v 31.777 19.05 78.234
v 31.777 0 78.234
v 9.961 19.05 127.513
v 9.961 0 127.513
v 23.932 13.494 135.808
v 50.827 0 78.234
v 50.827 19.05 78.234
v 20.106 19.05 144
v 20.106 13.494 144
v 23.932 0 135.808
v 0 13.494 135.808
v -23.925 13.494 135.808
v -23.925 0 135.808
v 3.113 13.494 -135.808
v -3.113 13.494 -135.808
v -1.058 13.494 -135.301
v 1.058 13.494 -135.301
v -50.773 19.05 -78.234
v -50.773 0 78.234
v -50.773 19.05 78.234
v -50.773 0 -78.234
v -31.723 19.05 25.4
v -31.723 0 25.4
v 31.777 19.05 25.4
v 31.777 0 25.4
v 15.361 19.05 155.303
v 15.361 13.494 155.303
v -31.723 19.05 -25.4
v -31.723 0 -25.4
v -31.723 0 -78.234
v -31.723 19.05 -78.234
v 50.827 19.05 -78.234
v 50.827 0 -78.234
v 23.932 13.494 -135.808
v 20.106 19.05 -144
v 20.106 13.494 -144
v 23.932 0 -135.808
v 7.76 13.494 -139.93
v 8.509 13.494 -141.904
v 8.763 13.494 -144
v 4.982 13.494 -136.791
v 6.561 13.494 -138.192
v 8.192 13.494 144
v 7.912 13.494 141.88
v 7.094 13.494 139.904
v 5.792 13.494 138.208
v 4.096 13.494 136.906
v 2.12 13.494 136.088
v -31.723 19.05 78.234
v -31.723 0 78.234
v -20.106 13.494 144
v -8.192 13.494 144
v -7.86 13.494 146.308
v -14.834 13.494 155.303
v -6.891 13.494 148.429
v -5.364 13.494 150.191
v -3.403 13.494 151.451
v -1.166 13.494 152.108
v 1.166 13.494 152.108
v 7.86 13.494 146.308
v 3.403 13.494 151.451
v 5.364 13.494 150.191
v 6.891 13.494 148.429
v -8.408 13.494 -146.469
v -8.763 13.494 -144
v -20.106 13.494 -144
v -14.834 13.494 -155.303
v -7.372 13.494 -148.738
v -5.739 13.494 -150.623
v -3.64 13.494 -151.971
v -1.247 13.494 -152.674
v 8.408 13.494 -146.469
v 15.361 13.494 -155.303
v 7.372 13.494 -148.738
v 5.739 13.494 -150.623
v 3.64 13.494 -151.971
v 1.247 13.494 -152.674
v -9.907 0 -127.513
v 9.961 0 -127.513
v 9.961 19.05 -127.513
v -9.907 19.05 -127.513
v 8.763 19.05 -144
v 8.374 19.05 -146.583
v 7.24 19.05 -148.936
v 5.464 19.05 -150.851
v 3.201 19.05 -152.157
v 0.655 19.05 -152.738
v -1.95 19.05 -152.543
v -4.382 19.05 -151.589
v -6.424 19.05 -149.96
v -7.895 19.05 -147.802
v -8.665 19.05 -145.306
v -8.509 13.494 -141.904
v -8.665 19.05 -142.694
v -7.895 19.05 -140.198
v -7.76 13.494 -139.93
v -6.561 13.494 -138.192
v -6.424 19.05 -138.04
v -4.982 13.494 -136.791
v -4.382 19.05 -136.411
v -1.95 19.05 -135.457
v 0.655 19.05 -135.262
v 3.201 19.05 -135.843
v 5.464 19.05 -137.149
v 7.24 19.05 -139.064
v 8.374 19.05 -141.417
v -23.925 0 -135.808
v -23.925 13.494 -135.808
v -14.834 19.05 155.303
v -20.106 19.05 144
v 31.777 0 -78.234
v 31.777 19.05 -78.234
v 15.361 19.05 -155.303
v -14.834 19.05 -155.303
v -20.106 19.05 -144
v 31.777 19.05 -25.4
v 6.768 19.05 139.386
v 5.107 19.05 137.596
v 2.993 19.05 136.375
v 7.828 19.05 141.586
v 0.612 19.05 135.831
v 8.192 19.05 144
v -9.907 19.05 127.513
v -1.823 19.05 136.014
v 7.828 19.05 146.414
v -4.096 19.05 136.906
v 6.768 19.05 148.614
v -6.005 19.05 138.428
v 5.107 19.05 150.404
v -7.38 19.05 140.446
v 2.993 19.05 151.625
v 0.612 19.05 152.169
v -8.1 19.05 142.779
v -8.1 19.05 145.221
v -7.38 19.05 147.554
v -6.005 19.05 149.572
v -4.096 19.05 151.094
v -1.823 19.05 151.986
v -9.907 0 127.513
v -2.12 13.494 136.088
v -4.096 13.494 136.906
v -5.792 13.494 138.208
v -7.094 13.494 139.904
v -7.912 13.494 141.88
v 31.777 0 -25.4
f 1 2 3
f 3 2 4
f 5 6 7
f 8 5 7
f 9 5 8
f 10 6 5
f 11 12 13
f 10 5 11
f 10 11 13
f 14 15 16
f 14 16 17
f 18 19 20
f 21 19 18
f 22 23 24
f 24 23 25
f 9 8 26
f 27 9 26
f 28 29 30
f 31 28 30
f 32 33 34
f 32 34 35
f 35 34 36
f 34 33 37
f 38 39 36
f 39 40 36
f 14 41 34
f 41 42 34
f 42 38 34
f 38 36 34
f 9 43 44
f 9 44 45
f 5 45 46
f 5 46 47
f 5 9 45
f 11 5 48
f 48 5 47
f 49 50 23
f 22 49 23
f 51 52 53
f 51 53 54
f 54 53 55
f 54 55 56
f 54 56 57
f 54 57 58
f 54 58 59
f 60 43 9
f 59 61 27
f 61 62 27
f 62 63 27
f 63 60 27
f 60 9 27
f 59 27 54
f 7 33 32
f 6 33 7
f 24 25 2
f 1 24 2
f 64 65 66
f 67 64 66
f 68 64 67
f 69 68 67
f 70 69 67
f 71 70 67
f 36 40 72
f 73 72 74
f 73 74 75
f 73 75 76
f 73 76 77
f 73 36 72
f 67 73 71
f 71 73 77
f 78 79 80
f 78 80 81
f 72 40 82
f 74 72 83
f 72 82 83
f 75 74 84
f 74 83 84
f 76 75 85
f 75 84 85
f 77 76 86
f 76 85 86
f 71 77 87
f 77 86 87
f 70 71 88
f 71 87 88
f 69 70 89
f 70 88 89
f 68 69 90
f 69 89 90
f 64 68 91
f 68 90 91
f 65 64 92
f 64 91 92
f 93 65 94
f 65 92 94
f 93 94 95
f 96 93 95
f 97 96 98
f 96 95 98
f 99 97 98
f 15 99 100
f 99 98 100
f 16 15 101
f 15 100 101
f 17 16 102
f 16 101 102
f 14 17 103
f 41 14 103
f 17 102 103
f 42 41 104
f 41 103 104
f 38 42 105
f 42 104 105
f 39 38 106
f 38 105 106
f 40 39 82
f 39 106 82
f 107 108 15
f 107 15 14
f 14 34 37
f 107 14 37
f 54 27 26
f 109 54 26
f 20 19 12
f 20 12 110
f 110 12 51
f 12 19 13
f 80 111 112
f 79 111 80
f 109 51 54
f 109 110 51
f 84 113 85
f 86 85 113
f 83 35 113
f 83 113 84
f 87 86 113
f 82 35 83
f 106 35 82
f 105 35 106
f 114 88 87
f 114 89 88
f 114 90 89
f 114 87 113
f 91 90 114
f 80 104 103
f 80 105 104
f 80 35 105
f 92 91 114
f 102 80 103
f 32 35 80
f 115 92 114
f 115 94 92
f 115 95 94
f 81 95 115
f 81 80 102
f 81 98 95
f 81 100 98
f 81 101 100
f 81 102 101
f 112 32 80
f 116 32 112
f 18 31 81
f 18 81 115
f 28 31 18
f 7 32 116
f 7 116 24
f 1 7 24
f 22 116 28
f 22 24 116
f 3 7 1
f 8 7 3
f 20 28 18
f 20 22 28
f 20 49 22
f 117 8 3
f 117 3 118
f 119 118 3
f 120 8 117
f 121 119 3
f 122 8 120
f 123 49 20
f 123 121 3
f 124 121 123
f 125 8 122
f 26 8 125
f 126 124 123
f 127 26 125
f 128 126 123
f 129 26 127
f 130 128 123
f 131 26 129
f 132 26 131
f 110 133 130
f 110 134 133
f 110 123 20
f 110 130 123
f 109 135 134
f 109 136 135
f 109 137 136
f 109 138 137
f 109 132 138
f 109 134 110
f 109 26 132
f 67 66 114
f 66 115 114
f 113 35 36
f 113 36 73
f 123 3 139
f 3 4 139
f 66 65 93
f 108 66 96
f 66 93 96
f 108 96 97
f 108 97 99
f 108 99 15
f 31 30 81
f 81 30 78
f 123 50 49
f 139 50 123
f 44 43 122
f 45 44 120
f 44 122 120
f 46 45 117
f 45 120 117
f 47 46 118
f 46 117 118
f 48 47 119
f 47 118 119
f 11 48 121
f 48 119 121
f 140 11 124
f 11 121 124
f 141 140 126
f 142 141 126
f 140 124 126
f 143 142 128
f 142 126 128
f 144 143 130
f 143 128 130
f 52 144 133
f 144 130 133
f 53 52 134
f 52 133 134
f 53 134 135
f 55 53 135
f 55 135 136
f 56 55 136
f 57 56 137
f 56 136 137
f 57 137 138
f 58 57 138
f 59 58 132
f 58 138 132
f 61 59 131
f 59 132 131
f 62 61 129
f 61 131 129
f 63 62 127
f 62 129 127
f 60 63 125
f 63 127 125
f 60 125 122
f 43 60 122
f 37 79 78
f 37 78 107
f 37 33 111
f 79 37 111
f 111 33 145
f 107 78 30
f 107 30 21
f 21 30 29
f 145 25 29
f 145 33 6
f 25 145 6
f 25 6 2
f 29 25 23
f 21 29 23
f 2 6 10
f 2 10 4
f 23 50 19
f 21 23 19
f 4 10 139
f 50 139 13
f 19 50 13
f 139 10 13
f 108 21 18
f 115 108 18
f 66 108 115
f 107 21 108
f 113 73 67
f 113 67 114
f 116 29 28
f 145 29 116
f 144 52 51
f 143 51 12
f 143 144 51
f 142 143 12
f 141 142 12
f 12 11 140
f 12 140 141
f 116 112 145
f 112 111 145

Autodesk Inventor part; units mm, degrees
ref_plane "YZ Plane" through (0, 0, 0) normal (1, 0, 0) x (0, 1, 0)
ref_plane "XZ Plane" through (0, 0, 0) normal (0, 1, 0) x (-1, 0, 0)
ref_plane "XY Plane" through (0, 0, 0) normal (0, 0, 1) x (1, 0, 0)
sketch "Sketch1" plane through (0, 0, 0) normal (0, 1, 0) x (-1, 0, 0)
  line L0 (0, -213.8682) -> (0, 213.8682) projected
  line L1 (20.1057, -144) -> (-20.1057, -144)
  line L2 (-50.827, -78.2337) -> (-50.827, 78.2337)
  line L3 (-20.1057, 144) -> (20.1057, 144)
  line L4 (50.773, 78.2337) -> (50.773, -78.2337)
  line L5 (158.1712, 0) -> (-85.66, 0) projected
  line L6 (50.773, 78.2337) -> (20.1057, 144)
  line L7 (50.773, 78.2337) -> (123.3381, 78.2337) construction
  line L8 (-50.827, 78.2337) -> (-20.1057, 144)
  line L9 (-20.1057, 144) -> (20.1057, 144)
  line L10 (31.723, 78.2337) -> (31.723, -78.2337)
  line L11 (-31.777, -78.2337) -> (-31.777, 78.2337)
  line L12 (-20.1057, -144) -> (20.1057, -144)
  line L13 (50.773, -78.2337) -> (20.1057, -144)
  line L14 (-50.827, -78.2337) -> (-20.1057, -144)
  line L15 (31.723, -25.4) -> (31.723, 25.4)
  line L16 (31.723, -25.4) -> (-31.777, -25.4)
  line L17 (31.723, 25.4) -> (-31.777, 25.4)
  line L18 (31.723, 78.2337) -> (9.9071, 127.5128)
  line L19 (-31.777, 78.2337) -> (-9.9611, 127.5128)
  line L20 (-9.9611, 127.5128) -> (9.9071, 127.5128)
  line L21 (50.773, 78.2337) -> (31.723, 78.2337)
  line L22 (-31.777, 78.2337) -> (-50.827, 78.2337)
  line L23 (31.723, -78.2337) -> (9.9071, -127.5128)
  line L24 (-31.777, -78.2337) -> (-9.9611, -127.5128)
  line L25 (-9.9611, -127.5128) -> (9.9071, -127.5128)
  line L26 (50.773, -78.2337) -> (31.723, -78.2337)
  line L27 (-31.777, -78.2337) -> (-50.827, -78.2337)
  point P0 (50.8, -140)
  point P1 (-50.8, 140)
  point P2 (-50.8, -140)
  dimension "d49" = 280
  dimension "d51" = 115
  dimension "d52" = 101.6
  dimension "d53" = 50.8
  dimension "d71" = 288
extrude "Extrusion1" add sketch "Sketch1" along normal blind 19.05 contours L1 L14 L27 L24 L25 L0 | L0 L25 L23 L26 L13 L1 | L16 L11 L5 L0 | L0 L5 L10 L16 | L26 L10 L5 L4 | L2 L5 L11 L27 | L5 L11 L17 L0 | L0 L17 L10 L5 | L5 L10 L21 L4 | L2 L22 L11 L5 | L21 L18 L20 L0 L3 L6 | L8 L3 L0 L20 L19 L22
sketch "Sketch9" plane through (50.827, 0, 78.2337) normal (1, 0, 0) x (0, 0, -1)
  line L0 (-65.7663, 19.05) -> (0, 19.05) projected
  line L1 (-65.7663, 19.05) -> (-65.7663, 0)
  line L2 (-65.7663, 0) -> (-65.7663, 19.05) projected
  line L3 (-65.7663, 9.525) -> (-52.4585, 9.525)
  line L4 (-65.7663, 13.4938) -> (-65.7663, 5.5563)
  line L5 (-65.7663, 19.05) -> (-77.0693, 19.05)
  line L6 (-65.7663, 19.05) -> (-54.4633, 19.05) construction
  line L7 (-65.7663, 13.4938) -> (-77.0693, 13.4937)
  line L8 (-77.0693, 13.4937) -> (-77.0693, 19.05)
  line L9 (-65.7663, 19.05) -> (-65.7663, 13.4938)
  line L10 (78.2337, -3.81) -> (78.2337, 22.86) projected
  line L11 (222.2337, 19.05) -> (233.5367, 19.05)
  line L12 (222.2337, 13.4938) -> (233.5367, 13.4937)
  line L13 (233.5367, 13.4937) -> (233.5367, 19.05)
  line L14 (222.2337, 19.05) -> (222.2337, 13.4938)
  point P0 (78.2337, 0)
  dimension "d55" = 7.9375
  dimension "d56" = 11.303
  dimension "d57" = 180
extrude "Extrusion9" add sketch "Sketch9" against normal up to surface (70.9326 mm away)
sketch "Sketch10" plane through (0, 19.05, 0) normal (0, 1, 0) x (1, 0, 0)
  line L0 (20.1057, -144) -> (50.827, -78.2337) projected
  line L1 (20.1057, -144) -> (15.3607, -155.303)
  line L2 (50.827, -155.303) -> (-20.1057, -155.303) projected
  line L3 (15.3607, -155.303) -> (50.53, -155.303)
  line L4 (50.827, -144) -> (20.1057, -144) projected
  line L5 (20.1057, -144) -> (50.827, -144)
  line L6 (50.827, -144) -> (50.827, -155.303) projected
  line L7 (50.827, -144) -> (50.827, -155.303)
  line L8 (50.827, -155.303) -> (50.827, -144)
  line L9 (50.827, -155.303) -> (15.3607, -155.303)
  line L10 (-71.093, 0) -> (71.147, 0) projected
  line L11 (20.1057, 144) -> (15.3607, 155.303)
  line L12 (15.3607, 155.303) -> (50.53, 155.303)
  line L13 (50.827, 144) -> (20.1057, 144)
  line L14 (20.1057, 144) -> (50.827, 144)
  line L15 (50.827, 144) -> (50.827, 155.303)
  line L16 (50.827, 144) -> (50.827, 155.303)
  line L17 (50.827, 155.303) -> (50.827, 144)
  line L18 (50.827, 155.303) -> (15.3607, 155.303)
  line L19 (-20.1057, -144) -> (-14.8343, -155.303)
  line L20 (-20.1057, -155.303) -> (-14.8343, -155.303)
  line L21 (-50.773, -78.2337) -> (-20.1057, -144) projected
  line L22 (-20.1057, -155.303) -> (-20.1057, -144)
  line L23 (-20.1057, 144) -> (-14.8343, 155.303)
  line L24 (-20.1057, 155.303) -> (-14.8343, 155.303)
  line L25 (-20.1057, 155.303) -> (-20.1057, 144)
  point P0 (0, 0)
extrude "Extrusion10" cut sketch "Sketch10" against normal up to surface (19.05 mm away)
ref_plane "Work Plane1" through (50.827, 5.5626, -144) normal (0, 1, 0) x (1, 0, 0)
sketch "Sketch13" plane through (0, 19.05, 0) normal (0, 1, 0) x (1, 0, 0)
  circle A0 centre (0, -144) radius 8.1915
  circle A1 centre (0, 144) radius 8.763
  line L0 (-71.093, 0) -> (71.147, 0) projected
  point P0 (0, 0)
  dimension "d68" = 16.383
  dimension "d69" = 17.526
  dimension "d70" = 288
extrude "Extrusion13" cut sketch "Sketch13" against normal up to surface (5.5562 mm away)
sketch "Sketch14" plane through (50.827, 0, 78.2337) normal (1, 0, 0) x (0, 0, -1)
  line L0 (-57.5748, 19.05) -> (-57.5748, 5.5626) projected
  line L1 (-57.5748, 19.05) -> (-57.5748, 5.5626) projected
  line L2 (-57.5748, 19.05) -> (-57.5748, 5.5626) projected
  line L3 (-65.7663, 13.4938) -> (-57.5748, 13.4938)
  line L4 (-57.5748, 5.5626) -> (-57.5748, 13.4938)
  line L5 (-65.7663, 0) -> (-65.7663, 13.4938) projected
  line L6 (78.2337, -3.81) -> (78.2337, 22.86) projected
  line L7 (222.2337, 13.4938) -> (214.0422, 13.4938)
  line L8 (214.0422, 5.5626) -> (214.0422, 13.4938)
  line L9 (222.2337, 5.5626) -> (222.2337, 13.4938)
  line L10 (-57.5748, 5.5626) -> (-57.5748, 0)
  line L11 (-65.7663, 0) -> (0, 0) projected
  line L12 (-57.5748, 0) -> (-65.7663, 0)
  line L13 (-65.7663, 0) -> (-65.7663, 13.4938) projected
  line L14 (-65.7663, 0) -> (-65.7663, 13.4938)
  line L15 (222.2337, 0) -> (222.2337, 13.4938) projected
  line L16 (222.2337, 5.5626) -> (222.2337, 0)
  line L17 (222.2337, 0) -> (213.1622, 0)
  line L18 (156.4673, 0) -> (222.2337, 0) projected
  line L19 (214.0422, 5.5626) -> (214.0422, 0)
  point P0 (78.2337, 0)
  point P1 (-65.7663, 5.5626)
extrude "Extrusion14" cut sketch "Sketch14" against normal through all
properties part number "Diff_BarV2"
